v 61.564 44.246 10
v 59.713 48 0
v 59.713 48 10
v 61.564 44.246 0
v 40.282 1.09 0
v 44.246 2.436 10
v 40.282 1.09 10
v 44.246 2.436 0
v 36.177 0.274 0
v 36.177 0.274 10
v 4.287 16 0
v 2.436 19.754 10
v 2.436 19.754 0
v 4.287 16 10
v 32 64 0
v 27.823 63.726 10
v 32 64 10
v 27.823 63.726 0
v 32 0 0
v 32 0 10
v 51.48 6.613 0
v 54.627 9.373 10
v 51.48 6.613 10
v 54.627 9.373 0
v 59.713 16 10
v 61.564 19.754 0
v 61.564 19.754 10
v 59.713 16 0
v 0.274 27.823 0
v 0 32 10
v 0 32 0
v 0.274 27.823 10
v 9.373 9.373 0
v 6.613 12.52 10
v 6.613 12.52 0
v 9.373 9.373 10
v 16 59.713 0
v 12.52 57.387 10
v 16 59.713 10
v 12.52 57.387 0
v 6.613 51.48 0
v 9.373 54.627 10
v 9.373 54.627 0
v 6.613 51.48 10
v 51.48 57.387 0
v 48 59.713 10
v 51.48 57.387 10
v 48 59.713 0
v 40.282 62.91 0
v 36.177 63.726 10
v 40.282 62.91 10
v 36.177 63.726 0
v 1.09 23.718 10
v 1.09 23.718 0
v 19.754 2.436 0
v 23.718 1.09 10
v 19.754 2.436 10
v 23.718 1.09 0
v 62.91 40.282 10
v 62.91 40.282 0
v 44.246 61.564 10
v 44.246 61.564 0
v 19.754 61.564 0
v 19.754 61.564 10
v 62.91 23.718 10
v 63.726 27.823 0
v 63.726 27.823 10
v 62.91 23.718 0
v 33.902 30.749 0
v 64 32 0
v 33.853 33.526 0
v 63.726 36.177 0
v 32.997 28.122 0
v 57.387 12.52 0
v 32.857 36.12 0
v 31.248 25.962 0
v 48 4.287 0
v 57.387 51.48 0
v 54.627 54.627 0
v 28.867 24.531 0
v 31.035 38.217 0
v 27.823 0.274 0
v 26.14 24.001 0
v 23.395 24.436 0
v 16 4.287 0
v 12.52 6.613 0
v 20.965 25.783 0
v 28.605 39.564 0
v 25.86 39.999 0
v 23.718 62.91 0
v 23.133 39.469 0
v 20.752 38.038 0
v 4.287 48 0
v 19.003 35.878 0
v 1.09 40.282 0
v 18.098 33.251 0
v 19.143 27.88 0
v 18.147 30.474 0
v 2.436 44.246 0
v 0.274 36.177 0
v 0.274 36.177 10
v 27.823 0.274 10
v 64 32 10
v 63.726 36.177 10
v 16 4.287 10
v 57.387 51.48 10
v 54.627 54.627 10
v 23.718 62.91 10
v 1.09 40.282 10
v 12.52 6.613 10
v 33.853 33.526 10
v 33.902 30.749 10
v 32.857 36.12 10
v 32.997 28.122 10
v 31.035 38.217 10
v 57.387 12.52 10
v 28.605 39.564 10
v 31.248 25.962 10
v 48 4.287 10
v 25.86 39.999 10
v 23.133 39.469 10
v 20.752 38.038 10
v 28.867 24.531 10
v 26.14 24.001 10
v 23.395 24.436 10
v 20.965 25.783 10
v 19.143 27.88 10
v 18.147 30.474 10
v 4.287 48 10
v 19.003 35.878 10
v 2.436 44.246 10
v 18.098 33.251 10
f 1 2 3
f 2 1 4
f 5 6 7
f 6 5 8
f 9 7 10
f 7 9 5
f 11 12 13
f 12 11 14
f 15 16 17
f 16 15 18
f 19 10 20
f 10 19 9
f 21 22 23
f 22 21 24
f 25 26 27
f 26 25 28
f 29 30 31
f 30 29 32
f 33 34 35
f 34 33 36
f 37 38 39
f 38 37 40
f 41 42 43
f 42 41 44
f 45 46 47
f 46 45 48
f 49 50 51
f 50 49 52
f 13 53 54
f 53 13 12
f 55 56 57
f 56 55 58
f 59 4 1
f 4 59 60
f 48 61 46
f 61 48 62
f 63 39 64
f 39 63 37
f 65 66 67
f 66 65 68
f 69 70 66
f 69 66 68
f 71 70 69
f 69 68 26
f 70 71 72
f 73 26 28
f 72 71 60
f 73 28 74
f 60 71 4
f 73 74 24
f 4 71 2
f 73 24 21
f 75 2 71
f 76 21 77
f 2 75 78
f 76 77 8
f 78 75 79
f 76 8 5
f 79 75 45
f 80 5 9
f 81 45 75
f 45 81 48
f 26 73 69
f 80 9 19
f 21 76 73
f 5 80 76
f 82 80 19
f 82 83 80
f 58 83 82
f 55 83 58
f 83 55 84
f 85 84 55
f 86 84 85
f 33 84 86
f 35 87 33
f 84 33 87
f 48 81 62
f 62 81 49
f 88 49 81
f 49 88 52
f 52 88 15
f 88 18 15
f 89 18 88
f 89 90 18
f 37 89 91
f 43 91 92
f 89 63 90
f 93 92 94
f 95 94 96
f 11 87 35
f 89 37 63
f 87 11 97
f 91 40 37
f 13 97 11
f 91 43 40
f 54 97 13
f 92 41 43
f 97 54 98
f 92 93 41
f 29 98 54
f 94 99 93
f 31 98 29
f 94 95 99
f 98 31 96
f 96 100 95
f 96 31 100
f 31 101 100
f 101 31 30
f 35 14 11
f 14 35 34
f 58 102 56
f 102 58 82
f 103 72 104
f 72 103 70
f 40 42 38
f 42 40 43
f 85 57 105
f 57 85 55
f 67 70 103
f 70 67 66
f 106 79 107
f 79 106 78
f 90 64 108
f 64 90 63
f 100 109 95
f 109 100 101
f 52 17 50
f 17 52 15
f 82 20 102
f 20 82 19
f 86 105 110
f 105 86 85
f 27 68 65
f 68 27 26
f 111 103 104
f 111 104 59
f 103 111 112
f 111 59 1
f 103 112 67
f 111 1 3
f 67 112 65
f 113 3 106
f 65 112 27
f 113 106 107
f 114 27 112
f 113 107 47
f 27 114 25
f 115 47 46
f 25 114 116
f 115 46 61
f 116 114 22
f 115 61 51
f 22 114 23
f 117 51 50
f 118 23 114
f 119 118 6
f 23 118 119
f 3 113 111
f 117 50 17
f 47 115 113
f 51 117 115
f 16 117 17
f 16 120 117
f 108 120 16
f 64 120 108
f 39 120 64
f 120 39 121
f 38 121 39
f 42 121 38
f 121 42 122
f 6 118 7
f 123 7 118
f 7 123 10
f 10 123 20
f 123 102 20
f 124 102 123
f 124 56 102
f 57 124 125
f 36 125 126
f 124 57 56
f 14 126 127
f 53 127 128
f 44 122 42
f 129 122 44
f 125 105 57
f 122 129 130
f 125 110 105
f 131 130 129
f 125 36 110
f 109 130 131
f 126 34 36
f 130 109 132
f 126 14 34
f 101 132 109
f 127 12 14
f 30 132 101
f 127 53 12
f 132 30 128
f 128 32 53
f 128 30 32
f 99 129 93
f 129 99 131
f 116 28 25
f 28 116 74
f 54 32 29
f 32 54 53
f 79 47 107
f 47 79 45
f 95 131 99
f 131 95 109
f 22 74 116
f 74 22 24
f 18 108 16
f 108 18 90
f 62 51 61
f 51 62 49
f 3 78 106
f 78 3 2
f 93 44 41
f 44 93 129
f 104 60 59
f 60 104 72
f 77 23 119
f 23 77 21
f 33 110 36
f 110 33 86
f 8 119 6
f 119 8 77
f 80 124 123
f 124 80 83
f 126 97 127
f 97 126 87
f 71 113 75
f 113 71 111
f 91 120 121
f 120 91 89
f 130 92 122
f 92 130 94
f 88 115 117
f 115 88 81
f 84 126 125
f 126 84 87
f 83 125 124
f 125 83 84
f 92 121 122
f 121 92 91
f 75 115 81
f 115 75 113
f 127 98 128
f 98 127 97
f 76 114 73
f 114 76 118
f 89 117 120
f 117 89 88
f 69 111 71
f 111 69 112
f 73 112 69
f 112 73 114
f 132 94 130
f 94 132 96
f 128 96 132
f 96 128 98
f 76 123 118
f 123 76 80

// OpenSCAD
$fn = 32;

// ----------------------------------------------------------------------
// Cam plate: eccentric cam, base R32
// ----------------------------------------------------------------------

// --- parameters (mm) ---
base_r = 32;              // base circle radius
lobe_h = 12;              // cam lobe rise
bore_r = 8;               // shaft bore radius
plate_t = 10;             // plate thickness, Z (extrusion height)
ecc = 6;                  // disc eccentricity

profile = [[64, 32], [63.726, 36.177], [62.91, 40.282], [61.564, 44.246], [59.713, 48], [57.387, 51.48], [54.627, 54.627], [51.48, 57.387], [48, 59.713], [44.246, 61.564], [40.282, 62.91], [36.177, 63.726], [32, 64], [27.823, 63.726], [23.718, 62.91], [19.754, 61.564], [16, 59.713], [12.52, 57.387], [9.373, 54.627], [6.613, 51.48], [4.287, 48], [2.436, 44.246], [1.09, 40.282], [0.274, 36.177], [0, 32], [0.274, 27.823], [1.09, 23.718], [2.436, 19.754], [4.287, 16], [6.613, 12.52], [9.373, 9.373], [12.52, 6.613], [16, 4.287], [19.754, 2.436], [23.718, 1.09], [27.823, 0.274], [32, 0], [36.177, 0.274], [40.282, 1.09], [44.246, 2.436], [48, 4.287], [51.48, 6.613], [54.627, 9.373], [57.387, 12.52], [59.713, 16], [61.564, 19.754], [62.91, 23.718], [63.726, 27.823]];  // primary outline, 48 points, counter clockwise
void_1 = [[33.853, 33.526], [32.857, 36.12], [31.035, 38.217], [28.605, 39.564], [25.86, 39.999], [23.133, 39.469], [20.752, 38.038], [19.003, 35.878], [18.098, 33.251], [18.147, 30.474], [19.143, 27.88], [20.965, 25.783], [23.395, 24.436], [26.14, 24.001], [28.867, 24.531], [31.248, 25.962], [32.997, 28.122], [33.902, 30.749]];  // shaft bore, 18 points

// --- the one profile operation ---
difference() {
  linear_extrude(height = plate_t) polygon(points = profile);
  translate([0, 0, -1])
    linear_extrude(height = plate_t + 2) polygon(points = void_1);
}
